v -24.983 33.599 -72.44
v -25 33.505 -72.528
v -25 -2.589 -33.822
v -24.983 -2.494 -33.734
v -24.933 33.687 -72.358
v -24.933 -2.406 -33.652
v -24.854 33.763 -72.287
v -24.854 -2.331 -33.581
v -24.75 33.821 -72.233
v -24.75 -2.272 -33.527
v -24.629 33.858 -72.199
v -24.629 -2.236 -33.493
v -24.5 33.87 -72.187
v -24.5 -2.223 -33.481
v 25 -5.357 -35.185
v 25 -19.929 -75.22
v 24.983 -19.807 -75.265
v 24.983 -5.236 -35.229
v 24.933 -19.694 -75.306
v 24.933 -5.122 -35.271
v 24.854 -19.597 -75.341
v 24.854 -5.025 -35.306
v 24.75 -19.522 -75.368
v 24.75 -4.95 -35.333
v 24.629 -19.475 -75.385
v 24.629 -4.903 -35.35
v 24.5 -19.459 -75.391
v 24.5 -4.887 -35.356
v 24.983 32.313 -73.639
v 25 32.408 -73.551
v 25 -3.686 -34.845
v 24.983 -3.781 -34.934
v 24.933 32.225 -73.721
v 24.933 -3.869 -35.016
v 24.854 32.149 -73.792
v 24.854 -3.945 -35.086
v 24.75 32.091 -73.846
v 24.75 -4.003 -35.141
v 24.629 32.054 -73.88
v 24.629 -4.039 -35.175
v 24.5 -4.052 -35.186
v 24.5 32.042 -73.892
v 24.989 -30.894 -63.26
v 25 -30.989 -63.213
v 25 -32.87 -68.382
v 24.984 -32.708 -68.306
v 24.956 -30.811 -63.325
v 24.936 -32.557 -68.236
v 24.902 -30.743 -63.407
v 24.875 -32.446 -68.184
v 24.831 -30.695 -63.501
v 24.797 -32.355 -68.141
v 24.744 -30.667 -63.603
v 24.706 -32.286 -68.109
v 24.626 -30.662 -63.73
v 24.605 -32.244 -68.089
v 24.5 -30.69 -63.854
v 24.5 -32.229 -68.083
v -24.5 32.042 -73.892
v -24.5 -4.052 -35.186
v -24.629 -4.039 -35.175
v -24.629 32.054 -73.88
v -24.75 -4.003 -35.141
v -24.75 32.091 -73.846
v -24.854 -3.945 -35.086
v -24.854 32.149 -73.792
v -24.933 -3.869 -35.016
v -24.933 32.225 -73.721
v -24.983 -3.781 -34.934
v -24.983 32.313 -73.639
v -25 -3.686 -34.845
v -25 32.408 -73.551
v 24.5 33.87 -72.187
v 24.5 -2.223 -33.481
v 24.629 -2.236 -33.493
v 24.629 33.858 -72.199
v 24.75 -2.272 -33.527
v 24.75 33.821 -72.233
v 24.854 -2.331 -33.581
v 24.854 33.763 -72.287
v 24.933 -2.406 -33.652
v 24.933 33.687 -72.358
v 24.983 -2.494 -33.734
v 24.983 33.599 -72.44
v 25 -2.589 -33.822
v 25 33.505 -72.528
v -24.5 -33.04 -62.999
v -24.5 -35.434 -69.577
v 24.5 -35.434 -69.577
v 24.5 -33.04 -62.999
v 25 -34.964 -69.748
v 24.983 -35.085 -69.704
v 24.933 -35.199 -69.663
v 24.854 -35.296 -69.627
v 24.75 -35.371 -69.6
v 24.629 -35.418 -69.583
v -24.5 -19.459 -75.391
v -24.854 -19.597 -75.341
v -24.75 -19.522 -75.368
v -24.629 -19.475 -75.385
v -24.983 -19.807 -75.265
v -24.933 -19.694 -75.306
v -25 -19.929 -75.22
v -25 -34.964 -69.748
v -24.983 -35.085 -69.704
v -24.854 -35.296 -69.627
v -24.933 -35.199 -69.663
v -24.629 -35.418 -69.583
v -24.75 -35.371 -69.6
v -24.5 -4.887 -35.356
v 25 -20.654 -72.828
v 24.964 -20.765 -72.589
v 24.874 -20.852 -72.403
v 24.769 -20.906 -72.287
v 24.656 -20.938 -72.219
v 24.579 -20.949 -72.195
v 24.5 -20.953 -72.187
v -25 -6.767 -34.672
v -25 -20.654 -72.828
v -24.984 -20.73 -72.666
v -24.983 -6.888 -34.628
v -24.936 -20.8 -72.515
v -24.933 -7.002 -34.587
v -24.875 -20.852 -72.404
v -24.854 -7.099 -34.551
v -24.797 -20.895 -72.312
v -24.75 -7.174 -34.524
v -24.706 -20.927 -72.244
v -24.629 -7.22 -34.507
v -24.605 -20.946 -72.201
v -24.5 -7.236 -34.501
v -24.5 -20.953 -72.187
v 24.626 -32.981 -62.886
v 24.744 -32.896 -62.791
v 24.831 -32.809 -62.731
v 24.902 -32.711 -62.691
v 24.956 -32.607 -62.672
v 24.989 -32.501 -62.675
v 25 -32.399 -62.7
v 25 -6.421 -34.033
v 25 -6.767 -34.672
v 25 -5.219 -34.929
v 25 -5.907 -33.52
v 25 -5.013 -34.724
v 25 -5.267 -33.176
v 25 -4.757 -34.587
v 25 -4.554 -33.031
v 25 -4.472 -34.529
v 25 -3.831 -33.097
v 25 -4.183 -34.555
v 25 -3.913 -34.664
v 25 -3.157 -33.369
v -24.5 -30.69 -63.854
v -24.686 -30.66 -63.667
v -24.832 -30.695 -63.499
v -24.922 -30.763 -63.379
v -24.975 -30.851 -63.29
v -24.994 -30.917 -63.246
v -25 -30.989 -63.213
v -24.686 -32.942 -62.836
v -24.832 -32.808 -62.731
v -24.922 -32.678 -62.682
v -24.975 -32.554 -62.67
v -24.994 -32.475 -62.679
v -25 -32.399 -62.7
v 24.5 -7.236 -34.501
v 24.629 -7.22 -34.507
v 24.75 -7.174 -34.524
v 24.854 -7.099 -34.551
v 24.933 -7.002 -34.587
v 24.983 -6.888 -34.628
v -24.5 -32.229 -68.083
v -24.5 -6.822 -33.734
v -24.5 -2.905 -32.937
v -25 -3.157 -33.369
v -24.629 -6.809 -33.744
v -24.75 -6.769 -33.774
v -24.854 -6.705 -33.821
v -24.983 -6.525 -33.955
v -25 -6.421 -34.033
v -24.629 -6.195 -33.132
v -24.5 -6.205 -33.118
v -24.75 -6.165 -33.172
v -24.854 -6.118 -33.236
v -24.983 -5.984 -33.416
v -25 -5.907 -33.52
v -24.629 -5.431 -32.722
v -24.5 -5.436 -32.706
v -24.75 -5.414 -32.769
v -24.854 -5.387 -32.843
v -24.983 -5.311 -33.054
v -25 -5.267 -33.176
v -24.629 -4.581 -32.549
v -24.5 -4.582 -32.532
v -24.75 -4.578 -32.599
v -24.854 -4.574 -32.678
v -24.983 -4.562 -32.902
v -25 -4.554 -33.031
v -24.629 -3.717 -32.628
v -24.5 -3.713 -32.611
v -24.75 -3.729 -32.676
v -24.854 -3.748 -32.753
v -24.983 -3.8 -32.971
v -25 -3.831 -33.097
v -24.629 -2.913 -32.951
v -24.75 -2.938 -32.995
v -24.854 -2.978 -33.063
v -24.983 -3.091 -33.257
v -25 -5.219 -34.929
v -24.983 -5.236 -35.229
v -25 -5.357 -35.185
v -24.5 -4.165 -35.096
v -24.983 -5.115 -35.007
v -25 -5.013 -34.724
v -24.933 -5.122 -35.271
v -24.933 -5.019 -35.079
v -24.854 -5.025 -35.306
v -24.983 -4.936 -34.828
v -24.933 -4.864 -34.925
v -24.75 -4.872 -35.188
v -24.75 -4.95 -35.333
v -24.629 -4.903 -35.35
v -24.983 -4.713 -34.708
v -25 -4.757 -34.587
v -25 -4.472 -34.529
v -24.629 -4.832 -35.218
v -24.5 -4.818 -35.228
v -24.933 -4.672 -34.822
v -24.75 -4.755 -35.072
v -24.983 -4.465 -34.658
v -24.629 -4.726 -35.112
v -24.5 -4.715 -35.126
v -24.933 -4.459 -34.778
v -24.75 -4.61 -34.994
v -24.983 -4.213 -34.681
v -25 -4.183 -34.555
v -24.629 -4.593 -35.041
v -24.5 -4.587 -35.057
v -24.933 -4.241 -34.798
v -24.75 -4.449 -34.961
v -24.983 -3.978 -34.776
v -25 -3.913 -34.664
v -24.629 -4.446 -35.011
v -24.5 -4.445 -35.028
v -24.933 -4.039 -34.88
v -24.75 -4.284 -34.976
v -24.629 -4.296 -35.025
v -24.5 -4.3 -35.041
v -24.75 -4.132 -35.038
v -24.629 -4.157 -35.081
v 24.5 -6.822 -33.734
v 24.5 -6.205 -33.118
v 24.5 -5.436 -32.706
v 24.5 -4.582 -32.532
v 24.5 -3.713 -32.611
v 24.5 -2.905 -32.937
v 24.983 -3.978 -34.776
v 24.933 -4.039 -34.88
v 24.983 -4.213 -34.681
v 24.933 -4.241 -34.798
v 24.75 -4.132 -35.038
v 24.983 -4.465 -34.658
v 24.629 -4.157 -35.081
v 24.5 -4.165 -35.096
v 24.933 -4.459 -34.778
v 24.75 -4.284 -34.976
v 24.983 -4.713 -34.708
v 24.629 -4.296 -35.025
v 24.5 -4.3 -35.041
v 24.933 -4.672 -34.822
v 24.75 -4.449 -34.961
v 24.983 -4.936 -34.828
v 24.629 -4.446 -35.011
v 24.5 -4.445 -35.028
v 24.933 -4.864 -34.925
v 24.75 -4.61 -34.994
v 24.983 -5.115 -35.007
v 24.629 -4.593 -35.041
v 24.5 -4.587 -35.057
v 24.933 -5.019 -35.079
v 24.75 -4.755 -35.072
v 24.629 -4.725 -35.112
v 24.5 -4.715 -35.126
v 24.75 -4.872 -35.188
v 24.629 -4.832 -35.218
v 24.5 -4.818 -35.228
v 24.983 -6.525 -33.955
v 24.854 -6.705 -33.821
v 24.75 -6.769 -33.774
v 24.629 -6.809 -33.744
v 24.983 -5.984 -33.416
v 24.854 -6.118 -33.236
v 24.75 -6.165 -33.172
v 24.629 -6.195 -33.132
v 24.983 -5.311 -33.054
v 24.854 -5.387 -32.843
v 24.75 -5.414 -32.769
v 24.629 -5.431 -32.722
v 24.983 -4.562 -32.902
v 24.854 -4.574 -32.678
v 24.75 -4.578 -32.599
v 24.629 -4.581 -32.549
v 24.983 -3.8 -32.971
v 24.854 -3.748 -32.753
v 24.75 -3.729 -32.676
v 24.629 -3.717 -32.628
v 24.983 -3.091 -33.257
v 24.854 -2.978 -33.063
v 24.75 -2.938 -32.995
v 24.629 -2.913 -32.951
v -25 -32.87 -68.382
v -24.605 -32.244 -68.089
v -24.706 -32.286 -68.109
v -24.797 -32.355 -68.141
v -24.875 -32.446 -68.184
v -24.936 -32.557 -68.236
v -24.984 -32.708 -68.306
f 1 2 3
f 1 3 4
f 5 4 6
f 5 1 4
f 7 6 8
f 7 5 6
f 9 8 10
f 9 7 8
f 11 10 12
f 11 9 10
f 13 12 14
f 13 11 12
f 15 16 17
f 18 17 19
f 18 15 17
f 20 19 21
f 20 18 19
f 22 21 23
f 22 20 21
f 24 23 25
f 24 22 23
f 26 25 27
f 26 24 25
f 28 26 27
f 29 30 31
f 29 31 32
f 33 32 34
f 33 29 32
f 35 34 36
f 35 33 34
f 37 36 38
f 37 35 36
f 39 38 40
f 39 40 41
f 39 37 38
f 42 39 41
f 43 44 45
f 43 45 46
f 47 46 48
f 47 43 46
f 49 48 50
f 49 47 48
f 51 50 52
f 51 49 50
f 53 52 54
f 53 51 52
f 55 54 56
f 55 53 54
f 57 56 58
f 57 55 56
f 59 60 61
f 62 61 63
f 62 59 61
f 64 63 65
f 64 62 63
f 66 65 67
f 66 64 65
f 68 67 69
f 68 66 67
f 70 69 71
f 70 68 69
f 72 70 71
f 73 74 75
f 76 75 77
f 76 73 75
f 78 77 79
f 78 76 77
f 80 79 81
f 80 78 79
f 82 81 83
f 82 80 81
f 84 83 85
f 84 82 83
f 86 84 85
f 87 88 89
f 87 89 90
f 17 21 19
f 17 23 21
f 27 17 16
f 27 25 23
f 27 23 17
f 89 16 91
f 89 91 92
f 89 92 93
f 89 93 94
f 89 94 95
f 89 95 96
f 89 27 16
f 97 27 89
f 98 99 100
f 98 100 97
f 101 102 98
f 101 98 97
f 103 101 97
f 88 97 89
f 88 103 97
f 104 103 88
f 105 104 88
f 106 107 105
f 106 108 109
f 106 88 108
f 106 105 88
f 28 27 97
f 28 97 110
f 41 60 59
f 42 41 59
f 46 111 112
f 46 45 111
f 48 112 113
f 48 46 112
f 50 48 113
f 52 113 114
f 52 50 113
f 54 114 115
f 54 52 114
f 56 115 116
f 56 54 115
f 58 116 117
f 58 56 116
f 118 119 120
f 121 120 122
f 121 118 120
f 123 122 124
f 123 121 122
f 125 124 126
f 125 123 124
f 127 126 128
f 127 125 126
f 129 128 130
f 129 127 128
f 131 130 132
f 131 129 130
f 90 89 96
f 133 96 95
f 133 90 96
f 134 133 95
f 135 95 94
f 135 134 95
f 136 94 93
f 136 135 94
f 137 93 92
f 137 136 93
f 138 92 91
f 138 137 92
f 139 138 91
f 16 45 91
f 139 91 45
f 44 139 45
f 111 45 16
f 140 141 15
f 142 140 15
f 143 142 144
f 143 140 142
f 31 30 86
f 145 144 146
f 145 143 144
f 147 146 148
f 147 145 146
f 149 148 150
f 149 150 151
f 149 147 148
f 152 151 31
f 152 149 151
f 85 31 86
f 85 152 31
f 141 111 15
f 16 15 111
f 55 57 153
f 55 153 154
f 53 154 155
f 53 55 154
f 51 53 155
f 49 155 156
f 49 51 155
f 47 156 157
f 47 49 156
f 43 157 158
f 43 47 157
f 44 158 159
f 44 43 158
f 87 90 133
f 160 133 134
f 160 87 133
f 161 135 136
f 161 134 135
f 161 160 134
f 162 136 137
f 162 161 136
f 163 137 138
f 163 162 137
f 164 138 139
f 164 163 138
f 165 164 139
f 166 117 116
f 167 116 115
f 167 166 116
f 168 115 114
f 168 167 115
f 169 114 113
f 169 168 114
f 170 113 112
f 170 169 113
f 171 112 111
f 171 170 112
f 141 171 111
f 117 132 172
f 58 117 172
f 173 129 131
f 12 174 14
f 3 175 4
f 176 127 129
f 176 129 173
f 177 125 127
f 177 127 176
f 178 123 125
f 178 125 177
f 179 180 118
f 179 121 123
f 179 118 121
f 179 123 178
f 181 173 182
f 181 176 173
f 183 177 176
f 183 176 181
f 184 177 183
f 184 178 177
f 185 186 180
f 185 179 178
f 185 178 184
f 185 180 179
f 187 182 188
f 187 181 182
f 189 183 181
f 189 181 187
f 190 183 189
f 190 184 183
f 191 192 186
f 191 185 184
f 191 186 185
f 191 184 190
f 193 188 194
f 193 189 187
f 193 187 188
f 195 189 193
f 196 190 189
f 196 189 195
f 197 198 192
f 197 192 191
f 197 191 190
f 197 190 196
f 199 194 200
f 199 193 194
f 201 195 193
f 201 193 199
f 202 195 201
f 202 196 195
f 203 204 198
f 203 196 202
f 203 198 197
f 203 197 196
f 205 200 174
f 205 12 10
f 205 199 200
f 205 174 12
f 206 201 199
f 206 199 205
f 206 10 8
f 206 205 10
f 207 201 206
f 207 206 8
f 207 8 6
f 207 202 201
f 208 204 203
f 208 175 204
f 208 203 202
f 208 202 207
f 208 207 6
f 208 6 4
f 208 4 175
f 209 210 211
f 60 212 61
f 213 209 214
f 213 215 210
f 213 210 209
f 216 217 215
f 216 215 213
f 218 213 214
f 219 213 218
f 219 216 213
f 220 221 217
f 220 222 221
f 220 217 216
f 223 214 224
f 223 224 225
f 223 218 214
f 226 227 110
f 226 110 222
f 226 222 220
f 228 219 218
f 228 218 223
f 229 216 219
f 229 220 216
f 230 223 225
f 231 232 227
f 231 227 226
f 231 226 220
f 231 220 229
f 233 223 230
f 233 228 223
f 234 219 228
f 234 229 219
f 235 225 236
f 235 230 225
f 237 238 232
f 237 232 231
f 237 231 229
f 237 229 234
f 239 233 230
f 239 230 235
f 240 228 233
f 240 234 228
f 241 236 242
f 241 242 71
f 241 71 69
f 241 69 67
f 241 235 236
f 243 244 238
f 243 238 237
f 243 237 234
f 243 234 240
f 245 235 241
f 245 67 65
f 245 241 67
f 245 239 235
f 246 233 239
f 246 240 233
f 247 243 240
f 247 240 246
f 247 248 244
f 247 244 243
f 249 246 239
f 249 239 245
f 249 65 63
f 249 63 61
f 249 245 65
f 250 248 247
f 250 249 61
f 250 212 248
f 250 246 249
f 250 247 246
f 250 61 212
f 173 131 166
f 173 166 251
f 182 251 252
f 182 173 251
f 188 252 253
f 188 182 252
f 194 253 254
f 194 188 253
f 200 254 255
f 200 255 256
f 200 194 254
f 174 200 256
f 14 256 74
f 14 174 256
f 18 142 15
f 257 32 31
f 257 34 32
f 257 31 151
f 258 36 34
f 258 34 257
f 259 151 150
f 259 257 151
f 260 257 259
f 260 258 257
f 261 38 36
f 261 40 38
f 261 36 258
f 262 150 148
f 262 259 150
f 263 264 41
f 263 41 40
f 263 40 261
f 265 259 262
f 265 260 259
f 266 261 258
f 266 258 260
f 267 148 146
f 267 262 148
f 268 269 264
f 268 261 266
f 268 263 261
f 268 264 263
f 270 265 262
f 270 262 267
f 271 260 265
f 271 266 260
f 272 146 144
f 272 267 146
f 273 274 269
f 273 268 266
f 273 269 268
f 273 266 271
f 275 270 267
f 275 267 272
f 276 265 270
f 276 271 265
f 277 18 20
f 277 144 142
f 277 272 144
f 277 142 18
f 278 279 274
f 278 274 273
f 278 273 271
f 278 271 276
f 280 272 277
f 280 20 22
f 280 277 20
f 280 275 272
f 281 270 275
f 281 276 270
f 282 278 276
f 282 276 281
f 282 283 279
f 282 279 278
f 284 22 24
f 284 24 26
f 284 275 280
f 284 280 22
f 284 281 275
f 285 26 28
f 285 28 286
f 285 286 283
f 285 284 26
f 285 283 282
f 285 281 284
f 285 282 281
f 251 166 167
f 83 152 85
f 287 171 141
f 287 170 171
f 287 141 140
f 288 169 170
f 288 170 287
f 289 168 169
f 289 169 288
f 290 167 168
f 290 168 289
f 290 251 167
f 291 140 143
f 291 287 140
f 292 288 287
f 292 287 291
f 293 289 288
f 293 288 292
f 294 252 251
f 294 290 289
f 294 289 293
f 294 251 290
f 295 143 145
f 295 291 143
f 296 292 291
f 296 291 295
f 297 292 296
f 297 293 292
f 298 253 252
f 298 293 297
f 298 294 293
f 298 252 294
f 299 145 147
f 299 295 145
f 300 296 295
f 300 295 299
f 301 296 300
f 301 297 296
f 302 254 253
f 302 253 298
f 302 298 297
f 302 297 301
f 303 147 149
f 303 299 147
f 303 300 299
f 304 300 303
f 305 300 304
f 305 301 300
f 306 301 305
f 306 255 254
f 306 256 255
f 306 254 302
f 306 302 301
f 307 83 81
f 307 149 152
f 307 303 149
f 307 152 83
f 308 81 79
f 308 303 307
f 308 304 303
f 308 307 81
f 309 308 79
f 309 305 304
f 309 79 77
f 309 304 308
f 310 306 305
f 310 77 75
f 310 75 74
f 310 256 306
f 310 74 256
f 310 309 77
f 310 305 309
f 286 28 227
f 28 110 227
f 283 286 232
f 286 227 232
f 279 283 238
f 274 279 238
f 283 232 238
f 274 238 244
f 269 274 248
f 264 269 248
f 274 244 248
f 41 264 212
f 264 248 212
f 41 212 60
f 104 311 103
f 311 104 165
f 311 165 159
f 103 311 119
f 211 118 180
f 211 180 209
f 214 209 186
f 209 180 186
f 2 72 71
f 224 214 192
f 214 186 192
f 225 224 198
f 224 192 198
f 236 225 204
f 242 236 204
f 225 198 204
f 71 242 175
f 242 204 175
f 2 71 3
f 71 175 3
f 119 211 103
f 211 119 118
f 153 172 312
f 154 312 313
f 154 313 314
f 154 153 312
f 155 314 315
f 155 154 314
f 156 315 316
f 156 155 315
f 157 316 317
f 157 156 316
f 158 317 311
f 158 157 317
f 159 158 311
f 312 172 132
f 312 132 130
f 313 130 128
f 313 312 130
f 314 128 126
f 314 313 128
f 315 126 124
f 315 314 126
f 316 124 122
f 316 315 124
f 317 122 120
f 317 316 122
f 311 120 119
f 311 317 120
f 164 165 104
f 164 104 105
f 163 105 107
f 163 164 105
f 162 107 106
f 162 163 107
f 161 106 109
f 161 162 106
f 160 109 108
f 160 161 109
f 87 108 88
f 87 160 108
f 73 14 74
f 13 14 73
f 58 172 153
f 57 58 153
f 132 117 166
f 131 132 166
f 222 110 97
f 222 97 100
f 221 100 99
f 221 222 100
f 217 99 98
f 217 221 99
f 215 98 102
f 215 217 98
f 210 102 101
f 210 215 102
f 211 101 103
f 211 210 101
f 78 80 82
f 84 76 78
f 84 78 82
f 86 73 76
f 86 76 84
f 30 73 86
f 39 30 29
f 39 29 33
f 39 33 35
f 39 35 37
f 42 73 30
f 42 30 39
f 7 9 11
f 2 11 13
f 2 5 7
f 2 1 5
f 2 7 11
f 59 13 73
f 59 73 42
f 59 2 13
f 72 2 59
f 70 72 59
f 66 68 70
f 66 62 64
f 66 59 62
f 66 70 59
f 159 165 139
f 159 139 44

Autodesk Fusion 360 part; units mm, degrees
sketch "Sketch1" plane through (0, 0, 0) normal (1, 0, 0) x (0, 1, 0) in component "stand"
  line L0 (-20.953, -72.187) -> (-7.2365, -34.5012)
  line L1 (-2.2234, -33.4813) -> (33.8703, -72.187)
  line L2 (-20.953, -72.187) -> (-32.2294, -68.0828)
  line L3 (-32.2294, -68.0828) -> (-30.5193, -63.3843)
  arc A0 (-2.2234, -33.4813) -> (-7.2365, -34.5012) centre (-4.4174, -35.5273) ccw
  line L4 (-4.0518, -35.1863) -> (32.042, -73.892)
  arc A1 (-4.0518, -35.1863) -> (-4.8873, -35.3562) centre (-4.4174, -35.5273) ccw
  line L5 (-19.4589, -75.3913) -> (-4.8873, -35.3562)
  line L6 (-19.4589, -75.3913) -> (-35.4336, -69.577)
  line L7 (-35.4336, -69.577) -> (-32.8685, -62.5293)
  line L8 (-32.8685, -62.5293) -> (-30.5193, -63.3843)
  line L9 (33.8703, -72.187) -> (32.042, -73.892)
  line L10 (-19.4589, -75.3913) -> (32.042, -73.892) construction
  point P0 (-20.953, -72.187)
  point P1 (-30.35, -68.7668)
  point P2 (-5.5621, -29.9009)
  dimension "d5" = 45
  dimension "d8" = 12
  dimension "d9" = 5
  dimension "d10" = 3
  dimension "d11" = 2.5
  dimension "d17" = 68.332
extrude "Extrude1" add sketch "Sketch1" along normal mid plane 50 in component "stand"
fillet "Fillet1" radius 0.5 20 edges at (25, 15.8235, -52.8342) (25, -5.0155, -32.5875) (25, -14.0948, -53.3441) (25, -12.1731, -55.3738) (25, -4.5171, -35.0373) (25, 13.9951, -54.5392) (25, -26.5912, -70.1349) (25, -34.1511, -66.0531) (25, -31.3743, -65.7336) (0, -30.5193, -63.3843) (0, -32.8685, -62.5293) (-25, 13.9951, -54.5392) (-25, -4.5171, -35.0373) (-25, -12.1731, -55.3738) (-25, -14.0948, -53.3441) (-25, -5.0155, -32.5875) (-25, 15.8235, -52.8342) (-25, -26.5912, -70.1349) (-25, -31.3743, -65.7336) (-25, -34.1511, -66.0531) in component "stand"
component "stand" placed x (1, 0, 0) y (0, 1, 0) z (0, 0, 1) at (0, 0, 0)
